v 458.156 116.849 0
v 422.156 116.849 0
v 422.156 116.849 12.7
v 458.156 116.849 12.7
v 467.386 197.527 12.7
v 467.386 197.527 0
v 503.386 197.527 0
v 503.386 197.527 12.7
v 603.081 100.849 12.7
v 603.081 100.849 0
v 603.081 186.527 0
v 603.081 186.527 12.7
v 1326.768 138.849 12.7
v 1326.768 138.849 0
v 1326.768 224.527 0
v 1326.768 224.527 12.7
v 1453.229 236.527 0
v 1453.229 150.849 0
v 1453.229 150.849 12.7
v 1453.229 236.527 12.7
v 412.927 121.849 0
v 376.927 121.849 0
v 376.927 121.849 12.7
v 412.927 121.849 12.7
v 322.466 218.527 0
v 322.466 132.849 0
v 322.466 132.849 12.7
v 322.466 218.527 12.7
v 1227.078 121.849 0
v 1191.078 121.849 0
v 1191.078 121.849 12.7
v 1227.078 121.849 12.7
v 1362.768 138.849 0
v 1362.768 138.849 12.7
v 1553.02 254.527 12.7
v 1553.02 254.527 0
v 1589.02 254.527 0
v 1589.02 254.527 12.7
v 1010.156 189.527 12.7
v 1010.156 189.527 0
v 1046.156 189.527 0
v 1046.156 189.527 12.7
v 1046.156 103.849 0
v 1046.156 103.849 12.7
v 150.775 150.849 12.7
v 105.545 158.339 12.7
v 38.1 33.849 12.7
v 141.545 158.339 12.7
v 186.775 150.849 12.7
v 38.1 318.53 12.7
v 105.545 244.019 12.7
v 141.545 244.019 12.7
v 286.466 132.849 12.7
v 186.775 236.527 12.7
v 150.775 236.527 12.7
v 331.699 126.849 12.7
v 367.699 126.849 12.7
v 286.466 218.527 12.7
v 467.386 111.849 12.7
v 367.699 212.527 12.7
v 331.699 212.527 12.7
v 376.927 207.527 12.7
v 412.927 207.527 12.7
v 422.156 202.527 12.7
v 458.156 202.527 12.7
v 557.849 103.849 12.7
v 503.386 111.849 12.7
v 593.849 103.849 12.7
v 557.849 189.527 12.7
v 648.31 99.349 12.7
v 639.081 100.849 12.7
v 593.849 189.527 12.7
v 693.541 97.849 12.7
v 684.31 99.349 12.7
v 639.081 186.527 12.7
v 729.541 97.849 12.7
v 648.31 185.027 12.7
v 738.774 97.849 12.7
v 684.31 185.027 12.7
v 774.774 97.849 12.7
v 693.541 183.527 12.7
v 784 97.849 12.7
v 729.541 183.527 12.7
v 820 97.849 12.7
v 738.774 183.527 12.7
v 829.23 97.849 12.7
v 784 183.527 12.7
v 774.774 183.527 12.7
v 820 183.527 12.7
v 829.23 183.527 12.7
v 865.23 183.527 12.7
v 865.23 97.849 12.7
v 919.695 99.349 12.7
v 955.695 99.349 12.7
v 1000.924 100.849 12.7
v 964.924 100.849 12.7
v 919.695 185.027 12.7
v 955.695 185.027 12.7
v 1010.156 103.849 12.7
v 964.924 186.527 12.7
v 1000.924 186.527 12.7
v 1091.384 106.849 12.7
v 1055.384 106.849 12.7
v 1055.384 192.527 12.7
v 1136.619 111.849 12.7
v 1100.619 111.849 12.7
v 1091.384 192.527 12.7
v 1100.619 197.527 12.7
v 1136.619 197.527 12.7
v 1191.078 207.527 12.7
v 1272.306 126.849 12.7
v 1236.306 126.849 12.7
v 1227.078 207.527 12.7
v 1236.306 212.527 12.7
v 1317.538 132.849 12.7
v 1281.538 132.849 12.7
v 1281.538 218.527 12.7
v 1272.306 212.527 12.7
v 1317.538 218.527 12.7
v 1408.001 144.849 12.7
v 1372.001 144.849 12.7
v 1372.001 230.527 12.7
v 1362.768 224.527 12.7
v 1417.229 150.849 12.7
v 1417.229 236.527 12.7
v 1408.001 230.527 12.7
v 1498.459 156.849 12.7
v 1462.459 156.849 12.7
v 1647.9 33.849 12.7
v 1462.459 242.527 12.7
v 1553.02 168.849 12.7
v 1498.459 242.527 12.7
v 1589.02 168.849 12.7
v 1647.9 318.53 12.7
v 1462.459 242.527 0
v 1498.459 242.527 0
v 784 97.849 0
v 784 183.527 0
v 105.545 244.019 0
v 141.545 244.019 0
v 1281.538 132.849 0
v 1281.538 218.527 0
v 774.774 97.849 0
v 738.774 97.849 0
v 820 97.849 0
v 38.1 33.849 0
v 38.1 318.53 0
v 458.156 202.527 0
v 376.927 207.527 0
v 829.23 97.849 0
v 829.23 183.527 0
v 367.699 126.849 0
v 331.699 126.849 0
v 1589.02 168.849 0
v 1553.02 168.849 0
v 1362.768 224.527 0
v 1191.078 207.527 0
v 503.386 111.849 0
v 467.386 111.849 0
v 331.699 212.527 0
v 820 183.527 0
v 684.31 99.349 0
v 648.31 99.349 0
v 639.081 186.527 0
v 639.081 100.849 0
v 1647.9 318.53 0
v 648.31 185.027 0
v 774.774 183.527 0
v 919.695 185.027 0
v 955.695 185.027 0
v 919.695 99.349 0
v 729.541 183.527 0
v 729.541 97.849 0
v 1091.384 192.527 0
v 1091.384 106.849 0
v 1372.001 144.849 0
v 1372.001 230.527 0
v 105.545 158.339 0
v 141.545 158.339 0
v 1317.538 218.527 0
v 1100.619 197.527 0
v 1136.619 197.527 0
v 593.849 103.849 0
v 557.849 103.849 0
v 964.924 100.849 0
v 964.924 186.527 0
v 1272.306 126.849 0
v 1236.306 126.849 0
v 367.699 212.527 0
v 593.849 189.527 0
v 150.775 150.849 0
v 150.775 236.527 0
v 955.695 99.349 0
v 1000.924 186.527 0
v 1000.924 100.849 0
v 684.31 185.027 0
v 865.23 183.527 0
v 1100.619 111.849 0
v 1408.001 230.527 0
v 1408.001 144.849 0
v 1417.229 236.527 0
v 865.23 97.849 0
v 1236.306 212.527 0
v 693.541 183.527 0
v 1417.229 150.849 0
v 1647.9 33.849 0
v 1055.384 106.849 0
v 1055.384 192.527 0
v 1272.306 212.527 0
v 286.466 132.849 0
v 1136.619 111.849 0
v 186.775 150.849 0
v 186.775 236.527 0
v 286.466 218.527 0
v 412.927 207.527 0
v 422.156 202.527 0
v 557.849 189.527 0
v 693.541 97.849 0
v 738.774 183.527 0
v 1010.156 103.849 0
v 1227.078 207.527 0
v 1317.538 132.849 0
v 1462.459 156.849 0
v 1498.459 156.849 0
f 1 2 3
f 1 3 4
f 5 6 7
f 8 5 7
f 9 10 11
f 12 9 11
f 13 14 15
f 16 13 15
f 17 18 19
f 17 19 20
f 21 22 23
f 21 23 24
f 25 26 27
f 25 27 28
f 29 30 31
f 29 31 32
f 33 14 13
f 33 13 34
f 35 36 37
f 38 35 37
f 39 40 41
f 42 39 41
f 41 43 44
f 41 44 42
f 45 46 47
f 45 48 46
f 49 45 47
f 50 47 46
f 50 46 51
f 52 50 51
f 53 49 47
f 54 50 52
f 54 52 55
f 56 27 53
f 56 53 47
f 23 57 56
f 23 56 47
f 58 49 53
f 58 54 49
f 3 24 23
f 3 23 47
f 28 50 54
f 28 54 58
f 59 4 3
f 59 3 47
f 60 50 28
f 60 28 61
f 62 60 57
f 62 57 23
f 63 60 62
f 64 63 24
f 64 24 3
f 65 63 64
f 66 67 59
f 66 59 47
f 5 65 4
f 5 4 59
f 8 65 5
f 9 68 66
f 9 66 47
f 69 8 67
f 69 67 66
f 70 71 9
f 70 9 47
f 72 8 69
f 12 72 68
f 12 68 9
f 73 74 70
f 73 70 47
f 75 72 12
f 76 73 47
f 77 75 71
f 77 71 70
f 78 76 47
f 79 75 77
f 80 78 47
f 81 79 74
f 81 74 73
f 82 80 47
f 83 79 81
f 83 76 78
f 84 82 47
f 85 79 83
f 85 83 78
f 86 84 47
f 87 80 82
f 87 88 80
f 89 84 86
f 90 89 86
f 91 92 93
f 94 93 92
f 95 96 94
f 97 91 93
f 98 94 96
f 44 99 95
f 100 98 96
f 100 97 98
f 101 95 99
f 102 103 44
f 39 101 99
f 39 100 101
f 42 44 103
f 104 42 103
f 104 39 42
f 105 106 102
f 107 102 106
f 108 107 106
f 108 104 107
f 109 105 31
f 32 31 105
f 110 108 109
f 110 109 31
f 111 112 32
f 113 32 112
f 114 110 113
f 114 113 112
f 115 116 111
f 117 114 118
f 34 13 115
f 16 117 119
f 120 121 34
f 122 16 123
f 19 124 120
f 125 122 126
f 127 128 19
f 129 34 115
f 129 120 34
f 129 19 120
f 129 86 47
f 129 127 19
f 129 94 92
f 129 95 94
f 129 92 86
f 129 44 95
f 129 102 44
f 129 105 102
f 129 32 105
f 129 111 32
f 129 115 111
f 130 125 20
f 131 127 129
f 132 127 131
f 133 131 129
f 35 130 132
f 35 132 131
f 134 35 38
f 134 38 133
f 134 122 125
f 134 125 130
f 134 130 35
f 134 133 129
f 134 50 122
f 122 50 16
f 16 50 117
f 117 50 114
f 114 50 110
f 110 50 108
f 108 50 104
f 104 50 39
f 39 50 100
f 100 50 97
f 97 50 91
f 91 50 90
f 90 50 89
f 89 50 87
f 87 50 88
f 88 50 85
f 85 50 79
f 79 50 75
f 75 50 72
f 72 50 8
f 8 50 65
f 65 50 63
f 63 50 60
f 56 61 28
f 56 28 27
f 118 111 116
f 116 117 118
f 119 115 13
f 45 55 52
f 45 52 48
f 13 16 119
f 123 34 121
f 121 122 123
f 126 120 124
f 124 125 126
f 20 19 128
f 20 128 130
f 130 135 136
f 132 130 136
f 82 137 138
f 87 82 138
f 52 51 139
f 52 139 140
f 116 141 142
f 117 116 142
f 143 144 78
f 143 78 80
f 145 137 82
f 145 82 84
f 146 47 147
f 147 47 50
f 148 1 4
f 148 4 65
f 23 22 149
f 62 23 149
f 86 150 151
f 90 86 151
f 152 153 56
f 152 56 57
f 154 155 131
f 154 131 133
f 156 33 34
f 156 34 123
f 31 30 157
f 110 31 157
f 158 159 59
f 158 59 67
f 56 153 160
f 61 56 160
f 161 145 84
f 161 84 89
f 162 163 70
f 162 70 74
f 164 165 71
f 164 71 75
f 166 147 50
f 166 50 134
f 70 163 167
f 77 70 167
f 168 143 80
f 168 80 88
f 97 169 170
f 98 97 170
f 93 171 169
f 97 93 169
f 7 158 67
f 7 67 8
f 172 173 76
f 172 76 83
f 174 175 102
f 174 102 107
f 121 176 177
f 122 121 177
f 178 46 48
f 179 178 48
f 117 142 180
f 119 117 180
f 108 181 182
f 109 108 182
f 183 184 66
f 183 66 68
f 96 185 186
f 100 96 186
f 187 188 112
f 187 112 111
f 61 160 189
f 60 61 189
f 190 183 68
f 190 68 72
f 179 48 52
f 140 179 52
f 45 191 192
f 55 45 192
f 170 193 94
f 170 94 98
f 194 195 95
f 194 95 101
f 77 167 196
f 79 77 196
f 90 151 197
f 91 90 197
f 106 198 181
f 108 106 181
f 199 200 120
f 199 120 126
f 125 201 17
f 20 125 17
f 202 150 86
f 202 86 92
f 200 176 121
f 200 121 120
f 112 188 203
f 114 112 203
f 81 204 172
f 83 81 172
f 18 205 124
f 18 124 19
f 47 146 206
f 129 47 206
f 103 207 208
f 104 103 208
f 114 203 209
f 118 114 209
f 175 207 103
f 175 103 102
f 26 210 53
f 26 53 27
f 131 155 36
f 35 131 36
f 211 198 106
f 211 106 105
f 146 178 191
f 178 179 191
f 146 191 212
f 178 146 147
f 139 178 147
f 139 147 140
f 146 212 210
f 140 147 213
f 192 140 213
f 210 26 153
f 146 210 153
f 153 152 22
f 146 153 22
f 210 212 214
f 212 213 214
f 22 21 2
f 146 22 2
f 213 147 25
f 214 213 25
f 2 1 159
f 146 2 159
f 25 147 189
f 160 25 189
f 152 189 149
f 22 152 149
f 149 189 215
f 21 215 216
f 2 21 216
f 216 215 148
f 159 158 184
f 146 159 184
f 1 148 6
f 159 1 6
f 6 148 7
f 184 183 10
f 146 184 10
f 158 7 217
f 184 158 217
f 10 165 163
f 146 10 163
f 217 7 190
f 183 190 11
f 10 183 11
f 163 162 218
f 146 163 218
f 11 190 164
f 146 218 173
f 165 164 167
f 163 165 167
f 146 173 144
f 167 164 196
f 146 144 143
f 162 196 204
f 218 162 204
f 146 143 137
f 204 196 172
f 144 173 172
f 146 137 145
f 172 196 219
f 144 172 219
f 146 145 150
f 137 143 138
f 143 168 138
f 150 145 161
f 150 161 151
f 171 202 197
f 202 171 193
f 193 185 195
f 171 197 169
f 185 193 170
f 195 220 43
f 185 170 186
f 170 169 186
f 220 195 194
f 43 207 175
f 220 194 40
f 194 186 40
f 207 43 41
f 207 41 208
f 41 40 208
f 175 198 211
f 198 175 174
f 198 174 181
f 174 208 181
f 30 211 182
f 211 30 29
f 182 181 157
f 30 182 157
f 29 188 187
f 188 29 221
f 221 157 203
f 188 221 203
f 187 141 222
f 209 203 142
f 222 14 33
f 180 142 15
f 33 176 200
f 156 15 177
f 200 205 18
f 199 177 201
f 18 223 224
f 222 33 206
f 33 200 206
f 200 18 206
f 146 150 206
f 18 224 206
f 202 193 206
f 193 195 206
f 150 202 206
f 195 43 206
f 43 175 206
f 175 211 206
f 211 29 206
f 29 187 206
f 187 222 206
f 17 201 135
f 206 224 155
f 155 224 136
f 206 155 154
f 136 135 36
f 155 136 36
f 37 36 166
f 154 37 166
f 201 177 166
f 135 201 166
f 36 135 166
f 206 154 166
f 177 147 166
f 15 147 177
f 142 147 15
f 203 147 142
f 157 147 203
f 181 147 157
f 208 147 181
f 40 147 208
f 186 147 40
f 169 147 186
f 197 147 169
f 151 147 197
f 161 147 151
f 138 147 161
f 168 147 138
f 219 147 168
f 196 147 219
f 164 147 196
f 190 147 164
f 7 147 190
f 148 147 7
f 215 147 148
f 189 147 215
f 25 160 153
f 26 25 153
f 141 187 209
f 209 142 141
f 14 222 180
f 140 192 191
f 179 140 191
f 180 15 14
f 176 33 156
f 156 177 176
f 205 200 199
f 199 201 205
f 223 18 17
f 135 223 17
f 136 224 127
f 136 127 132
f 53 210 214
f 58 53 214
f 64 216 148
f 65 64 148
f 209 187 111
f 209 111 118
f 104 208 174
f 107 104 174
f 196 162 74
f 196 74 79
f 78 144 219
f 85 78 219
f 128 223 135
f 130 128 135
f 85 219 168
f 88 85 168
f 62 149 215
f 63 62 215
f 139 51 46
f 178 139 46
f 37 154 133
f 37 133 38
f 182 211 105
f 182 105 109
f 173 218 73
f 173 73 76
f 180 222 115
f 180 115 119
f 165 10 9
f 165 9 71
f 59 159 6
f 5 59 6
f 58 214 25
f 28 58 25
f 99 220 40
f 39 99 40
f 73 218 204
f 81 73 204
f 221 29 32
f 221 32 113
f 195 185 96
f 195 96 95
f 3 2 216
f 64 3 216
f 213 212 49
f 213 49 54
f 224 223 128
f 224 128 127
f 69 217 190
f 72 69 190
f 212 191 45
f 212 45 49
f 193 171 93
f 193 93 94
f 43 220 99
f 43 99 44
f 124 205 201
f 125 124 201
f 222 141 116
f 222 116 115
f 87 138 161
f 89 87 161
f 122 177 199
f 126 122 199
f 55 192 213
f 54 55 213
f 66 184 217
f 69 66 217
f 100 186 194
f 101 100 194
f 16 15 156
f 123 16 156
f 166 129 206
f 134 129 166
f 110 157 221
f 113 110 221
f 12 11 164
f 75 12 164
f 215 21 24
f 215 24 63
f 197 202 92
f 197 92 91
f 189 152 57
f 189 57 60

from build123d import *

# Parameters (mm, degrees)
SKETCH2_W           = 1647.9
SKETCH2_H           = 284.681734848
SKETCH2_W_2         = 36
SKETCH2_H_2         = 85.677465121
BOSS_EXTRUDE1_DEPTH = 12.7
SKETCH3_W           = 19.05
SKETCH3_H           = 284.681734848
CUT_EXTRUDE1_DEPTH  = 13.7
SKETCH4_W           = 36
SKETCH4_H           = 50.330449982
SKETCH4_H_2         = 35.349550018
CUT_EXTRUDE2_DEPTH  = 13.7


with BuildPart() as part:
    # Sketch2 → Boss-Extrude1 (new body)
    with BuildSketch(Plane.XY):
        with Locations((842.999943303, 176.189566708)):
            Rectangle(SKETCH2_W, SKETCH2_H)
        with Locations((1571.01994314, 211.688120447)):
            Rectangle(SKETCH2_W_2, SKETCH2_H_2, mode=Mode.SUBTRACT)
        with Locations((1480.459247559, 199.688120447)):
            Rectangle(SKETCH2_W_2, SKETCH2_H_2, mode=Mode.SUBTRACT)
        with Locations((1435.229386921, 193.688120447)):
            Rectangle(SKETCH2_W_2, SKETCH2_H_2, mode=Mode.SUBTRACT)
        with Locations((1390.000695887, 187.688120447)):
            Rectangle(SKETCH2_W_2, SKETCH2_H_2, mode=Mode.SUBTRACT)
        with Locations((1344.768303255, 181.688120447)):
            Rectangle(SKETCH2_W_2, SKETCH2_H_2, mode=Mode.SUBTRACT)
        with Locations((1299.538396377, 175.688120447)):
            Rectangle(SKETCH2_W_2, SKETCH2_H_2, mode=Mode.SUBTRACT)
        with Locations((1254.306140471, 169.688120446)):
            Rectangle(SKETCH2_W_2, SKETCH2_H_2, mode=Mode.SUBTRACT)
        with Locations((1209.07770281, 164.688120446)):
            Rectangle(SKETCH2_W_2, SKETCH2_H_2, mode=Mode.SUBTRACT)
        with Locations((1118.618578512, 154.688120446)):
            Rectangle(SKETCH2_W_2, SKETCH2_H_2, mode=Mode.SUBTRACT)
        with Locations((1073.383844827, 149.688120446)):
            Rectangle(SKETCH2_W_2, SKETCH2_H_2, mode=Mode.SUBTRACT)
        with Locations((1028.155686863, 146.688120446)):
            Rectangle(SKETCH2_W_2, SKETCH2_H_2, mode=Mode.SUBTRACT)
        with Locations((982.9239215, 143.688120446)):
            Rectangle(SKETCH2_W_2, SKETCH2_H_2, mode=Mode.SUBTRACT)
        with Locations((937.694704034, 142.188120446)):
            Rectangle(SKETCH2_W_2, SKETCH2_H_2, mode=Mode.SUBTRACT)
        with Locations((847.230489128, 140.688120446)):
            Rectangle(SKETCH2_W_2, SKETCH2_H_2, mode=Mode.SUBTRACT)
        with Locations((801.999943303, 140.688120446)):
            Rectangle(SKETCH2_W_2, SKETCH2_H_2, mode=Mode.SUBTRACT)
        with Locations((756.774236257, 140.688120446)):
            Rectangle(SKETCH2_W_2, SKETCH2_H_2, mode=Mode.SUBTRACT)
        with Locations((711.541406556, 140.688120446)):
            Rectangle(SKETCH2_W_2, SKETCH2_H_2, mode=Mode.SUBTRACT)
        with Locations((666.310021351, 142.188120446)):
            Rectangle(SKETCH2_W_2, SKETCH2_H_2, mode=Mode.SUBTRACT)
        with Locations((621.080803885, 143.688120446)):
            Rectangle(SKETCH2_W_2, SKETCH2_H_2, mode=Mode.SUBTRACT)
        with Locations((575.849038522, 146.688120446)):
            Rectangle(SKETCH2_W_2, SKETCH2_H_2, mode=Mode.SUBTRACT)
        with Locations((485.386146872, 154.688120446)):
            Rectangle(SKETCH2_W_2, SKETCH2_H_2, mode=Mode.SUBTRACT)
        with Locations((304.466329007, 175.688120447)):
            Rectangle(SKETCH2_W_2, SKETCH2_H_2, mode=Mode.SUBTRACT)
        with Locations((440.15644292, 159.688120446)):
            Rectangle(SKETCH2_W_2, SKETCH2_H_2, mode=Mode.SUBTRACT)
        with Locations((394.927022575, 164.688120446)):
            Rectangle(SKETCH2_W_2, SKETCH2_H_2, mode=Mode.SUBTRACT)
        with Locations((349.698584914, 169.688120446)):
            Rectangle(SKETCH2_W_2, SKETCH2_H_2, mode=Mode.SUBTRACT)
        with Locations((168.775338464, 193.688120447)):
            Rectangle(SKETCH2_W_2, SKETCH2_H_2, mode=Mode.SUBTRACT)
    extrude(amount=BOSS_EXTRUDE1_DEPTH)

    # Sketch3 → Cut-Extrude1 (cut, through all)
    with BuildSketch(Plane.XY.offset(12.7)):
        with Locations((1657.424943303, 176.189566708)):
            Rectangle(SKETCH3_W, SKETCH3_H)
        with Locations((28.574943303, 176.189566708)):
            Rectangle(SKETCH3_W, SKETCH3_H)
    extrude(amount=-CUT_EXTRUDE1_DEPTH, mode=Mode.SUBTRACT)

    # Sketch4 → Cut-Extrude2 (cut, through all)
    with BuildSketch(Plane.XY.offset(12.7)):
        with Locations((123.545338464, 218.853345438)):
            Rectangle(SKETCH4_W, SKETCH4_H)
        with Locations((123.545338464, 176.013345438)):
            Rectangle(SKETCH4_W, SKETCH4_H_2)
    extrude(amount=-CUT_EXTRUDE2_DEPTH, mode=Mode.SUBTRACT)


solid = part.part
